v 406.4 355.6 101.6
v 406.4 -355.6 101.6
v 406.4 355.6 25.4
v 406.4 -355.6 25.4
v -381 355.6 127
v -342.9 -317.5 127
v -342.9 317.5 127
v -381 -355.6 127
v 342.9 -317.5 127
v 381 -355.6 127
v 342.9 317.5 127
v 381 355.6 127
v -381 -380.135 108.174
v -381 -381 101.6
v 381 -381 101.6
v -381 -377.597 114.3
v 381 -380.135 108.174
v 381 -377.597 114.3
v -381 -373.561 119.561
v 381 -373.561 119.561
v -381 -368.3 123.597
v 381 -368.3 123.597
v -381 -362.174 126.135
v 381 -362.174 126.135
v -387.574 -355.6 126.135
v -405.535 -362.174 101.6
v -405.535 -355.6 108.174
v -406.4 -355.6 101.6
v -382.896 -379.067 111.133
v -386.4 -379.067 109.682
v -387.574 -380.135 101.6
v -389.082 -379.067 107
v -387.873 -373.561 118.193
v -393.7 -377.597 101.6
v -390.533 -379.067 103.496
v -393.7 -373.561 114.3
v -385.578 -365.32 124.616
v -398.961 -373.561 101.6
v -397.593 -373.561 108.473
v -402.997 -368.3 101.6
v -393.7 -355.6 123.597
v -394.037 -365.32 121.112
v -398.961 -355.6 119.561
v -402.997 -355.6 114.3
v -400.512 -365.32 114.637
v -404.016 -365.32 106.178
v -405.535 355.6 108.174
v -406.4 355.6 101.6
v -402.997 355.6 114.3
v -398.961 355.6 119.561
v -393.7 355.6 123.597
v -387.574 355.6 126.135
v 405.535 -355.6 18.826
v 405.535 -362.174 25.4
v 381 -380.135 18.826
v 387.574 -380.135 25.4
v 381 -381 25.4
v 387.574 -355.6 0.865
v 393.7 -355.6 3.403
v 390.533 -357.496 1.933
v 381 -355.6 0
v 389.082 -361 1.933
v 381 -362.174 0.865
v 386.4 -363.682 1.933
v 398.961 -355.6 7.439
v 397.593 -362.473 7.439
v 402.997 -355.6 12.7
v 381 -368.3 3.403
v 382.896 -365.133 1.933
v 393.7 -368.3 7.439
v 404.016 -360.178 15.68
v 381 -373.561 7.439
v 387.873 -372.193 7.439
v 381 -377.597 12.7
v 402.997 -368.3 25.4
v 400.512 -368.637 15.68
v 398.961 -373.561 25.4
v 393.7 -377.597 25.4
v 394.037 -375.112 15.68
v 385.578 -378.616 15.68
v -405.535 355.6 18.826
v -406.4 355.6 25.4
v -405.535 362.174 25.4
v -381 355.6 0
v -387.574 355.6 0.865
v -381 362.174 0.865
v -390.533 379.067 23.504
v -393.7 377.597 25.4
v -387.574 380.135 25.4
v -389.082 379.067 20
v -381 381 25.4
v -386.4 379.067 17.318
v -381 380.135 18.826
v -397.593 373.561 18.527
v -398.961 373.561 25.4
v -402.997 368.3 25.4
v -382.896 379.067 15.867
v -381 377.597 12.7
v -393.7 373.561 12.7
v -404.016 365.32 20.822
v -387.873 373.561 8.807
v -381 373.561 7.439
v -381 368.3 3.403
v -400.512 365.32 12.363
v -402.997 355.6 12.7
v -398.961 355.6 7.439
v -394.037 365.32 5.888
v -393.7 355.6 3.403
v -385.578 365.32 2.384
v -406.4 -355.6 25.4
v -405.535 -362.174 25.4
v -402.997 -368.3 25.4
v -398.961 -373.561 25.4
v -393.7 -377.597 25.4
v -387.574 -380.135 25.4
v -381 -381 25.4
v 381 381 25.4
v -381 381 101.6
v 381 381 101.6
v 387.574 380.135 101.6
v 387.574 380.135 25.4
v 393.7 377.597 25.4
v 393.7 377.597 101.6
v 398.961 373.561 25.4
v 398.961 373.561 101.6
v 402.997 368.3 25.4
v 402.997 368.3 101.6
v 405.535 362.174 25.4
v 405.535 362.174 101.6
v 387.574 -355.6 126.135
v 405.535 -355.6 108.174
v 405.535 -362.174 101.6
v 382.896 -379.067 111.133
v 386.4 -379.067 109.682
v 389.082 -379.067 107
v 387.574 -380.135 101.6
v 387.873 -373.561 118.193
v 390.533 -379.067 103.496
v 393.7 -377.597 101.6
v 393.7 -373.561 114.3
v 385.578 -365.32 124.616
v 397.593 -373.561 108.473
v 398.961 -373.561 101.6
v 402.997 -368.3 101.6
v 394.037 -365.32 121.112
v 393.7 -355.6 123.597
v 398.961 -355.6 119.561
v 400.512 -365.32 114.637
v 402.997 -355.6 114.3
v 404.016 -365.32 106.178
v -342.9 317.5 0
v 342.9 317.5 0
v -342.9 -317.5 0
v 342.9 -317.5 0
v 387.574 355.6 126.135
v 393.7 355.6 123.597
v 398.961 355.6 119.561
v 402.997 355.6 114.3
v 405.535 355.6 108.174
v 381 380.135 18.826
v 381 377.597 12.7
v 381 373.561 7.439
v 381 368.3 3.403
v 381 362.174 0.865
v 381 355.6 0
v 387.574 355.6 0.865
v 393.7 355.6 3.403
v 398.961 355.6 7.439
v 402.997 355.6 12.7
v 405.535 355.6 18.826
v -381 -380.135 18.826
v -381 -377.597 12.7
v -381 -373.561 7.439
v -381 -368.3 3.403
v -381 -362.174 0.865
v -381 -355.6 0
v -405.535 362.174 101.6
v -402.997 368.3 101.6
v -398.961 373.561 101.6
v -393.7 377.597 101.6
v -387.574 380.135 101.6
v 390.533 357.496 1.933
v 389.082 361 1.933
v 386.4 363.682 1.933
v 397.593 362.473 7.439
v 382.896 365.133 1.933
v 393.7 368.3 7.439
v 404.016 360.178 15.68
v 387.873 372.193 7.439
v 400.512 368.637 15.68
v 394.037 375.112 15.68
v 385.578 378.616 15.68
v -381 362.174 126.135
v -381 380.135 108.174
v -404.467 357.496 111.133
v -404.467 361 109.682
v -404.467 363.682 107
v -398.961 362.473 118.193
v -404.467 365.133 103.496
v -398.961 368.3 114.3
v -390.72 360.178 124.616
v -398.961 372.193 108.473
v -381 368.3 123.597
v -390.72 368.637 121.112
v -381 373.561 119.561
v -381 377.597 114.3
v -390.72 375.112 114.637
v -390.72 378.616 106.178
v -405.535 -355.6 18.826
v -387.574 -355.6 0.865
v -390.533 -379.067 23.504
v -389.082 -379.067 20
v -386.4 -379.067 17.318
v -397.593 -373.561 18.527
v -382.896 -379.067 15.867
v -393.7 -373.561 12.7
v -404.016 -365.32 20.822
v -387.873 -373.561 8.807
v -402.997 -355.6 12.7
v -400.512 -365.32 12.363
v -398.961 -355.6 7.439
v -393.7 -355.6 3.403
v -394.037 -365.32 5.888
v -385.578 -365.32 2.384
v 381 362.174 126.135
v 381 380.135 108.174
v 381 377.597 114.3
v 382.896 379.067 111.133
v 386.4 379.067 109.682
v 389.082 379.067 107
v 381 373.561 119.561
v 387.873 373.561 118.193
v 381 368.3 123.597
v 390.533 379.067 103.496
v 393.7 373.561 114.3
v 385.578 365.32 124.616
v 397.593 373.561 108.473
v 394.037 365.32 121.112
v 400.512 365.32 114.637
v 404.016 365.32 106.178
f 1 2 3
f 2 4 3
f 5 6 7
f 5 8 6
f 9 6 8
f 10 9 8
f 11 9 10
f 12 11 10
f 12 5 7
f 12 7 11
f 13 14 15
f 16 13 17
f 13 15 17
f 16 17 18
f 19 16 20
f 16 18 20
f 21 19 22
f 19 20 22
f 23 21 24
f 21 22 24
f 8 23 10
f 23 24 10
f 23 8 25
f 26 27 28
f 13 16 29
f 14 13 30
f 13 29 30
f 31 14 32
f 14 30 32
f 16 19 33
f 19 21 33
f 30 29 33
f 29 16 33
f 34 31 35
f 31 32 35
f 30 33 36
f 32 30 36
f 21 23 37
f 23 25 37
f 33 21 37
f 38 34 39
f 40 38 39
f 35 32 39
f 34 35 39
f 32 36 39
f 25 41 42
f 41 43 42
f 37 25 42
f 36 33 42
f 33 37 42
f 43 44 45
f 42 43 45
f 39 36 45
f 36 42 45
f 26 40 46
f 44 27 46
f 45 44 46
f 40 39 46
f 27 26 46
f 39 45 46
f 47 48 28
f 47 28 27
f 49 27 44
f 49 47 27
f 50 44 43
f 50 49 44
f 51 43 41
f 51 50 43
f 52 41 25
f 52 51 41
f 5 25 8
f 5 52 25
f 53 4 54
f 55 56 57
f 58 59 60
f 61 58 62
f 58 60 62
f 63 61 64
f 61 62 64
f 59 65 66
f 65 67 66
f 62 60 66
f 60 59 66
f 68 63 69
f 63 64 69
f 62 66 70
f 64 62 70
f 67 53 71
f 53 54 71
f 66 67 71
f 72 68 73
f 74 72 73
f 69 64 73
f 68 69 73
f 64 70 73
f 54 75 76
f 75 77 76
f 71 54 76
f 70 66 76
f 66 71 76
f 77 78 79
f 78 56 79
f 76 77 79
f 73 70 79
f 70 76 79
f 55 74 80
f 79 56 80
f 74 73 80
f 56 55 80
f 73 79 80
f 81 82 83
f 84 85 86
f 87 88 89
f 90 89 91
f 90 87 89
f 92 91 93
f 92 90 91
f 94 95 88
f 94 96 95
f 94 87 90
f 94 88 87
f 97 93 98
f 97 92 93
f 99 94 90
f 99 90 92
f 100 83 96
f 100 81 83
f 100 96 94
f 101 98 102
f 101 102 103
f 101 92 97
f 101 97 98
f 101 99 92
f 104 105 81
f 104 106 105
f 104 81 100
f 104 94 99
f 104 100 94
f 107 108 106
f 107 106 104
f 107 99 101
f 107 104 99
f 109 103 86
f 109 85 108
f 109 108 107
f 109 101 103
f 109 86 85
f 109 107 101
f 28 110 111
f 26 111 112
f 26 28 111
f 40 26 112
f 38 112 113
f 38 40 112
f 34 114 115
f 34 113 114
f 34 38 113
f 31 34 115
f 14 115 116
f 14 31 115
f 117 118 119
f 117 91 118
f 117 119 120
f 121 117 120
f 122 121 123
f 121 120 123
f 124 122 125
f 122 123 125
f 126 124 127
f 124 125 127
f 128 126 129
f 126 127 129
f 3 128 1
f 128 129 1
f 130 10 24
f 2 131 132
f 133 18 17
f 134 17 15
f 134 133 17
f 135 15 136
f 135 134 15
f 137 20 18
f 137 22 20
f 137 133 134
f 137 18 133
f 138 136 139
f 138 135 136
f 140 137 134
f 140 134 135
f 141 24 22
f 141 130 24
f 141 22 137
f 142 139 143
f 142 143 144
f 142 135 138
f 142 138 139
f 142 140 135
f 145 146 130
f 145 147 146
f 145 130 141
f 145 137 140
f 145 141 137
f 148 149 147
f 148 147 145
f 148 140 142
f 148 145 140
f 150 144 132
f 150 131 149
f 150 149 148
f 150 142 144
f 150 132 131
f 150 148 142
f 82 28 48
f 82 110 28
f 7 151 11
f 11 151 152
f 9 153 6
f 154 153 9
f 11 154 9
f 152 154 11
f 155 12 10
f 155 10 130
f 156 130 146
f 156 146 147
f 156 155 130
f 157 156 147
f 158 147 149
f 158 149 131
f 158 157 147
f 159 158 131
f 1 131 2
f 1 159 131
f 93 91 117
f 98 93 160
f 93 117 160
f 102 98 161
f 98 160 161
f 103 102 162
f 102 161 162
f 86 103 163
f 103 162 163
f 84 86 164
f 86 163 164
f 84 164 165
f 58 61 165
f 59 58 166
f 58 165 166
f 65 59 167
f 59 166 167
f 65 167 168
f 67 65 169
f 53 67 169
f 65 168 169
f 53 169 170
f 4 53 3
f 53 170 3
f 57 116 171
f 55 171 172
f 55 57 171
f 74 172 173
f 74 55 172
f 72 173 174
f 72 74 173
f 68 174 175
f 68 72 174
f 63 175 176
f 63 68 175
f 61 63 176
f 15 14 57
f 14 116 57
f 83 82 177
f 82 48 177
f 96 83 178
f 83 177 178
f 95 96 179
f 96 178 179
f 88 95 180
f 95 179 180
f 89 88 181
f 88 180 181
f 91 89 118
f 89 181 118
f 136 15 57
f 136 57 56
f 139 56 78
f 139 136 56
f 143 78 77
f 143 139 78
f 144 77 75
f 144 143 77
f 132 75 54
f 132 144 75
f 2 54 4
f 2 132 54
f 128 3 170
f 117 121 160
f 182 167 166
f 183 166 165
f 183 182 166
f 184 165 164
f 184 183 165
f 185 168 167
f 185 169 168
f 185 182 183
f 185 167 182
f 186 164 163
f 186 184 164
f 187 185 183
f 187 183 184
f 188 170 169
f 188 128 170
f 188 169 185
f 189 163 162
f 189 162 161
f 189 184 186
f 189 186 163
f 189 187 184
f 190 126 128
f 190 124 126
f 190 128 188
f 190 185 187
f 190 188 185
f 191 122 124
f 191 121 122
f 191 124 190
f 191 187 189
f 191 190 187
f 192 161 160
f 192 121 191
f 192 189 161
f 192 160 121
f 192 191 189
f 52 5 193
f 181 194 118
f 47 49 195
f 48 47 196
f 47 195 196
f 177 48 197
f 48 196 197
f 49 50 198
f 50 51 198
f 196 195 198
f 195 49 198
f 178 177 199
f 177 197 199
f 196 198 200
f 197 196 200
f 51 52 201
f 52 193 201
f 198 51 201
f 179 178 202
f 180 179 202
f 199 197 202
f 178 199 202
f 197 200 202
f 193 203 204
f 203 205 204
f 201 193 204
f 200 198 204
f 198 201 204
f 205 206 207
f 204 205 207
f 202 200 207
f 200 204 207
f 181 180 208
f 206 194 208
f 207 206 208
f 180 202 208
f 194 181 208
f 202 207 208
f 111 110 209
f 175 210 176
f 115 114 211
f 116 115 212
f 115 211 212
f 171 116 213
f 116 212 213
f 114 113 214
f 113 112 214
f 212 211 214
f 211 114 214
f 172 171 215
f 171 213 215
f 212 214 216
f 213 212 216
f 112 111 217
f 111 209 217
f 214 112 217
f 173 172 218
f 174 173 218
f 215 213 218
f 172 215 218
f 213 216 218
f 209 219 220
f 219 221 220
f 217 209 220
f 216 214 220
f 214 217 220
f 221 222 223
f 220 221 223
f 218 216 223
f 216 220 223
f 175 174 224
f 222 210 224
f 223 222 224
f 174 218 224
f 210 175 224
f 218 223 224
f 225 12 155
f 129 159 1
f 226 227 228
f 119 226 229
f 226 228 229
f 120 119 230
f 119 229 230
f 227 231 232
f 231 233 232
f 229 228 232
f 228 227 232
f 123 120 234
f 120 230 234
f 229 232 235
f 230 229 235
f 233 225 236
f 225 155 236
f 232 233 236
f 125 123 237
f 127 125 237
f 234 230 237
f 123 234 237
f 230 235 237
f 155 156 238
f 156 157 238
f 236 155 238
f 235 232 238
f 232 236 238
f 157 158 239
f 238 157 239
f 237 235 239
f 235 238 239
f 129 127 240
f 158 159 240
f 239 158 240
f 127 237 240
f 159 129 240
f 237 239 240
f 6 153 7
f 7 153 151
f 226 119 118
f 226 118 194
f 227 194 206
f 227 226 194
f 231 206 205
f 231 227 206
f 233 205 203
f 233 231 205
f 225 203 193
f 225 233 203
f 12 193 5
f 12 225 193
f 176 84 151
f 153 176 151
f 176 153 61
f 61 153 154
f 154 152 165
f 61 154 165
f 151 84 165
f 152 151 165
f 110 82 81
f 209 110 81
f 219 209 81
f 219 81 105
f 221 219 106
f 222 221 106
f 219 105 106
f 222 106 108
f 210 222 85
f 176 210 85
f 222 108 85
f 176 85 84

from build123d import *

# Parameters (mm, degrees)
F0_W     = 812.8
F0_H     = 762
F2_DEPTH = 127
F1_W     = 685.8
F1_H     = 635
F3_DEPTH = 215.9
F4_R     = 25.4


with BuildPart() as f2:
    # F0 (on Top) → F2 (new body)
    with BuildSketch(Plane.XY):
        Rectangle(F0_W, F0_H)
    extrude(amount=F2_DEPTH)

    # F1 (on face) → F3 (cut)
    with BuildSketch(Plane.XY):
        Rectangle(F1_W, F1_H)
    extrude(amount=F3_DEPTH, mode=Mode.SUBTRACT)

    # F4
    f4_edges = [f2.edges().sort_by_distance(p)[0] for p in [
        (406.4, 0, 127),
        (0, 381, 127),
        (-406.4, 0, 127),
        (0, -381, 127),
        (-406.4, 0, 0),
        (-406.4, -381, 63.5),
        (-406.4, 381, 63.5),
        (406.4, -381, 63.5),
        (406.4, 381, 63.5),
        (406.4, 0, 0),
        (0, 381, 0),
        (0, -381, 0),
    ]]
    fillet(f4_edges, radius=F4_R)


solid = f2.part
